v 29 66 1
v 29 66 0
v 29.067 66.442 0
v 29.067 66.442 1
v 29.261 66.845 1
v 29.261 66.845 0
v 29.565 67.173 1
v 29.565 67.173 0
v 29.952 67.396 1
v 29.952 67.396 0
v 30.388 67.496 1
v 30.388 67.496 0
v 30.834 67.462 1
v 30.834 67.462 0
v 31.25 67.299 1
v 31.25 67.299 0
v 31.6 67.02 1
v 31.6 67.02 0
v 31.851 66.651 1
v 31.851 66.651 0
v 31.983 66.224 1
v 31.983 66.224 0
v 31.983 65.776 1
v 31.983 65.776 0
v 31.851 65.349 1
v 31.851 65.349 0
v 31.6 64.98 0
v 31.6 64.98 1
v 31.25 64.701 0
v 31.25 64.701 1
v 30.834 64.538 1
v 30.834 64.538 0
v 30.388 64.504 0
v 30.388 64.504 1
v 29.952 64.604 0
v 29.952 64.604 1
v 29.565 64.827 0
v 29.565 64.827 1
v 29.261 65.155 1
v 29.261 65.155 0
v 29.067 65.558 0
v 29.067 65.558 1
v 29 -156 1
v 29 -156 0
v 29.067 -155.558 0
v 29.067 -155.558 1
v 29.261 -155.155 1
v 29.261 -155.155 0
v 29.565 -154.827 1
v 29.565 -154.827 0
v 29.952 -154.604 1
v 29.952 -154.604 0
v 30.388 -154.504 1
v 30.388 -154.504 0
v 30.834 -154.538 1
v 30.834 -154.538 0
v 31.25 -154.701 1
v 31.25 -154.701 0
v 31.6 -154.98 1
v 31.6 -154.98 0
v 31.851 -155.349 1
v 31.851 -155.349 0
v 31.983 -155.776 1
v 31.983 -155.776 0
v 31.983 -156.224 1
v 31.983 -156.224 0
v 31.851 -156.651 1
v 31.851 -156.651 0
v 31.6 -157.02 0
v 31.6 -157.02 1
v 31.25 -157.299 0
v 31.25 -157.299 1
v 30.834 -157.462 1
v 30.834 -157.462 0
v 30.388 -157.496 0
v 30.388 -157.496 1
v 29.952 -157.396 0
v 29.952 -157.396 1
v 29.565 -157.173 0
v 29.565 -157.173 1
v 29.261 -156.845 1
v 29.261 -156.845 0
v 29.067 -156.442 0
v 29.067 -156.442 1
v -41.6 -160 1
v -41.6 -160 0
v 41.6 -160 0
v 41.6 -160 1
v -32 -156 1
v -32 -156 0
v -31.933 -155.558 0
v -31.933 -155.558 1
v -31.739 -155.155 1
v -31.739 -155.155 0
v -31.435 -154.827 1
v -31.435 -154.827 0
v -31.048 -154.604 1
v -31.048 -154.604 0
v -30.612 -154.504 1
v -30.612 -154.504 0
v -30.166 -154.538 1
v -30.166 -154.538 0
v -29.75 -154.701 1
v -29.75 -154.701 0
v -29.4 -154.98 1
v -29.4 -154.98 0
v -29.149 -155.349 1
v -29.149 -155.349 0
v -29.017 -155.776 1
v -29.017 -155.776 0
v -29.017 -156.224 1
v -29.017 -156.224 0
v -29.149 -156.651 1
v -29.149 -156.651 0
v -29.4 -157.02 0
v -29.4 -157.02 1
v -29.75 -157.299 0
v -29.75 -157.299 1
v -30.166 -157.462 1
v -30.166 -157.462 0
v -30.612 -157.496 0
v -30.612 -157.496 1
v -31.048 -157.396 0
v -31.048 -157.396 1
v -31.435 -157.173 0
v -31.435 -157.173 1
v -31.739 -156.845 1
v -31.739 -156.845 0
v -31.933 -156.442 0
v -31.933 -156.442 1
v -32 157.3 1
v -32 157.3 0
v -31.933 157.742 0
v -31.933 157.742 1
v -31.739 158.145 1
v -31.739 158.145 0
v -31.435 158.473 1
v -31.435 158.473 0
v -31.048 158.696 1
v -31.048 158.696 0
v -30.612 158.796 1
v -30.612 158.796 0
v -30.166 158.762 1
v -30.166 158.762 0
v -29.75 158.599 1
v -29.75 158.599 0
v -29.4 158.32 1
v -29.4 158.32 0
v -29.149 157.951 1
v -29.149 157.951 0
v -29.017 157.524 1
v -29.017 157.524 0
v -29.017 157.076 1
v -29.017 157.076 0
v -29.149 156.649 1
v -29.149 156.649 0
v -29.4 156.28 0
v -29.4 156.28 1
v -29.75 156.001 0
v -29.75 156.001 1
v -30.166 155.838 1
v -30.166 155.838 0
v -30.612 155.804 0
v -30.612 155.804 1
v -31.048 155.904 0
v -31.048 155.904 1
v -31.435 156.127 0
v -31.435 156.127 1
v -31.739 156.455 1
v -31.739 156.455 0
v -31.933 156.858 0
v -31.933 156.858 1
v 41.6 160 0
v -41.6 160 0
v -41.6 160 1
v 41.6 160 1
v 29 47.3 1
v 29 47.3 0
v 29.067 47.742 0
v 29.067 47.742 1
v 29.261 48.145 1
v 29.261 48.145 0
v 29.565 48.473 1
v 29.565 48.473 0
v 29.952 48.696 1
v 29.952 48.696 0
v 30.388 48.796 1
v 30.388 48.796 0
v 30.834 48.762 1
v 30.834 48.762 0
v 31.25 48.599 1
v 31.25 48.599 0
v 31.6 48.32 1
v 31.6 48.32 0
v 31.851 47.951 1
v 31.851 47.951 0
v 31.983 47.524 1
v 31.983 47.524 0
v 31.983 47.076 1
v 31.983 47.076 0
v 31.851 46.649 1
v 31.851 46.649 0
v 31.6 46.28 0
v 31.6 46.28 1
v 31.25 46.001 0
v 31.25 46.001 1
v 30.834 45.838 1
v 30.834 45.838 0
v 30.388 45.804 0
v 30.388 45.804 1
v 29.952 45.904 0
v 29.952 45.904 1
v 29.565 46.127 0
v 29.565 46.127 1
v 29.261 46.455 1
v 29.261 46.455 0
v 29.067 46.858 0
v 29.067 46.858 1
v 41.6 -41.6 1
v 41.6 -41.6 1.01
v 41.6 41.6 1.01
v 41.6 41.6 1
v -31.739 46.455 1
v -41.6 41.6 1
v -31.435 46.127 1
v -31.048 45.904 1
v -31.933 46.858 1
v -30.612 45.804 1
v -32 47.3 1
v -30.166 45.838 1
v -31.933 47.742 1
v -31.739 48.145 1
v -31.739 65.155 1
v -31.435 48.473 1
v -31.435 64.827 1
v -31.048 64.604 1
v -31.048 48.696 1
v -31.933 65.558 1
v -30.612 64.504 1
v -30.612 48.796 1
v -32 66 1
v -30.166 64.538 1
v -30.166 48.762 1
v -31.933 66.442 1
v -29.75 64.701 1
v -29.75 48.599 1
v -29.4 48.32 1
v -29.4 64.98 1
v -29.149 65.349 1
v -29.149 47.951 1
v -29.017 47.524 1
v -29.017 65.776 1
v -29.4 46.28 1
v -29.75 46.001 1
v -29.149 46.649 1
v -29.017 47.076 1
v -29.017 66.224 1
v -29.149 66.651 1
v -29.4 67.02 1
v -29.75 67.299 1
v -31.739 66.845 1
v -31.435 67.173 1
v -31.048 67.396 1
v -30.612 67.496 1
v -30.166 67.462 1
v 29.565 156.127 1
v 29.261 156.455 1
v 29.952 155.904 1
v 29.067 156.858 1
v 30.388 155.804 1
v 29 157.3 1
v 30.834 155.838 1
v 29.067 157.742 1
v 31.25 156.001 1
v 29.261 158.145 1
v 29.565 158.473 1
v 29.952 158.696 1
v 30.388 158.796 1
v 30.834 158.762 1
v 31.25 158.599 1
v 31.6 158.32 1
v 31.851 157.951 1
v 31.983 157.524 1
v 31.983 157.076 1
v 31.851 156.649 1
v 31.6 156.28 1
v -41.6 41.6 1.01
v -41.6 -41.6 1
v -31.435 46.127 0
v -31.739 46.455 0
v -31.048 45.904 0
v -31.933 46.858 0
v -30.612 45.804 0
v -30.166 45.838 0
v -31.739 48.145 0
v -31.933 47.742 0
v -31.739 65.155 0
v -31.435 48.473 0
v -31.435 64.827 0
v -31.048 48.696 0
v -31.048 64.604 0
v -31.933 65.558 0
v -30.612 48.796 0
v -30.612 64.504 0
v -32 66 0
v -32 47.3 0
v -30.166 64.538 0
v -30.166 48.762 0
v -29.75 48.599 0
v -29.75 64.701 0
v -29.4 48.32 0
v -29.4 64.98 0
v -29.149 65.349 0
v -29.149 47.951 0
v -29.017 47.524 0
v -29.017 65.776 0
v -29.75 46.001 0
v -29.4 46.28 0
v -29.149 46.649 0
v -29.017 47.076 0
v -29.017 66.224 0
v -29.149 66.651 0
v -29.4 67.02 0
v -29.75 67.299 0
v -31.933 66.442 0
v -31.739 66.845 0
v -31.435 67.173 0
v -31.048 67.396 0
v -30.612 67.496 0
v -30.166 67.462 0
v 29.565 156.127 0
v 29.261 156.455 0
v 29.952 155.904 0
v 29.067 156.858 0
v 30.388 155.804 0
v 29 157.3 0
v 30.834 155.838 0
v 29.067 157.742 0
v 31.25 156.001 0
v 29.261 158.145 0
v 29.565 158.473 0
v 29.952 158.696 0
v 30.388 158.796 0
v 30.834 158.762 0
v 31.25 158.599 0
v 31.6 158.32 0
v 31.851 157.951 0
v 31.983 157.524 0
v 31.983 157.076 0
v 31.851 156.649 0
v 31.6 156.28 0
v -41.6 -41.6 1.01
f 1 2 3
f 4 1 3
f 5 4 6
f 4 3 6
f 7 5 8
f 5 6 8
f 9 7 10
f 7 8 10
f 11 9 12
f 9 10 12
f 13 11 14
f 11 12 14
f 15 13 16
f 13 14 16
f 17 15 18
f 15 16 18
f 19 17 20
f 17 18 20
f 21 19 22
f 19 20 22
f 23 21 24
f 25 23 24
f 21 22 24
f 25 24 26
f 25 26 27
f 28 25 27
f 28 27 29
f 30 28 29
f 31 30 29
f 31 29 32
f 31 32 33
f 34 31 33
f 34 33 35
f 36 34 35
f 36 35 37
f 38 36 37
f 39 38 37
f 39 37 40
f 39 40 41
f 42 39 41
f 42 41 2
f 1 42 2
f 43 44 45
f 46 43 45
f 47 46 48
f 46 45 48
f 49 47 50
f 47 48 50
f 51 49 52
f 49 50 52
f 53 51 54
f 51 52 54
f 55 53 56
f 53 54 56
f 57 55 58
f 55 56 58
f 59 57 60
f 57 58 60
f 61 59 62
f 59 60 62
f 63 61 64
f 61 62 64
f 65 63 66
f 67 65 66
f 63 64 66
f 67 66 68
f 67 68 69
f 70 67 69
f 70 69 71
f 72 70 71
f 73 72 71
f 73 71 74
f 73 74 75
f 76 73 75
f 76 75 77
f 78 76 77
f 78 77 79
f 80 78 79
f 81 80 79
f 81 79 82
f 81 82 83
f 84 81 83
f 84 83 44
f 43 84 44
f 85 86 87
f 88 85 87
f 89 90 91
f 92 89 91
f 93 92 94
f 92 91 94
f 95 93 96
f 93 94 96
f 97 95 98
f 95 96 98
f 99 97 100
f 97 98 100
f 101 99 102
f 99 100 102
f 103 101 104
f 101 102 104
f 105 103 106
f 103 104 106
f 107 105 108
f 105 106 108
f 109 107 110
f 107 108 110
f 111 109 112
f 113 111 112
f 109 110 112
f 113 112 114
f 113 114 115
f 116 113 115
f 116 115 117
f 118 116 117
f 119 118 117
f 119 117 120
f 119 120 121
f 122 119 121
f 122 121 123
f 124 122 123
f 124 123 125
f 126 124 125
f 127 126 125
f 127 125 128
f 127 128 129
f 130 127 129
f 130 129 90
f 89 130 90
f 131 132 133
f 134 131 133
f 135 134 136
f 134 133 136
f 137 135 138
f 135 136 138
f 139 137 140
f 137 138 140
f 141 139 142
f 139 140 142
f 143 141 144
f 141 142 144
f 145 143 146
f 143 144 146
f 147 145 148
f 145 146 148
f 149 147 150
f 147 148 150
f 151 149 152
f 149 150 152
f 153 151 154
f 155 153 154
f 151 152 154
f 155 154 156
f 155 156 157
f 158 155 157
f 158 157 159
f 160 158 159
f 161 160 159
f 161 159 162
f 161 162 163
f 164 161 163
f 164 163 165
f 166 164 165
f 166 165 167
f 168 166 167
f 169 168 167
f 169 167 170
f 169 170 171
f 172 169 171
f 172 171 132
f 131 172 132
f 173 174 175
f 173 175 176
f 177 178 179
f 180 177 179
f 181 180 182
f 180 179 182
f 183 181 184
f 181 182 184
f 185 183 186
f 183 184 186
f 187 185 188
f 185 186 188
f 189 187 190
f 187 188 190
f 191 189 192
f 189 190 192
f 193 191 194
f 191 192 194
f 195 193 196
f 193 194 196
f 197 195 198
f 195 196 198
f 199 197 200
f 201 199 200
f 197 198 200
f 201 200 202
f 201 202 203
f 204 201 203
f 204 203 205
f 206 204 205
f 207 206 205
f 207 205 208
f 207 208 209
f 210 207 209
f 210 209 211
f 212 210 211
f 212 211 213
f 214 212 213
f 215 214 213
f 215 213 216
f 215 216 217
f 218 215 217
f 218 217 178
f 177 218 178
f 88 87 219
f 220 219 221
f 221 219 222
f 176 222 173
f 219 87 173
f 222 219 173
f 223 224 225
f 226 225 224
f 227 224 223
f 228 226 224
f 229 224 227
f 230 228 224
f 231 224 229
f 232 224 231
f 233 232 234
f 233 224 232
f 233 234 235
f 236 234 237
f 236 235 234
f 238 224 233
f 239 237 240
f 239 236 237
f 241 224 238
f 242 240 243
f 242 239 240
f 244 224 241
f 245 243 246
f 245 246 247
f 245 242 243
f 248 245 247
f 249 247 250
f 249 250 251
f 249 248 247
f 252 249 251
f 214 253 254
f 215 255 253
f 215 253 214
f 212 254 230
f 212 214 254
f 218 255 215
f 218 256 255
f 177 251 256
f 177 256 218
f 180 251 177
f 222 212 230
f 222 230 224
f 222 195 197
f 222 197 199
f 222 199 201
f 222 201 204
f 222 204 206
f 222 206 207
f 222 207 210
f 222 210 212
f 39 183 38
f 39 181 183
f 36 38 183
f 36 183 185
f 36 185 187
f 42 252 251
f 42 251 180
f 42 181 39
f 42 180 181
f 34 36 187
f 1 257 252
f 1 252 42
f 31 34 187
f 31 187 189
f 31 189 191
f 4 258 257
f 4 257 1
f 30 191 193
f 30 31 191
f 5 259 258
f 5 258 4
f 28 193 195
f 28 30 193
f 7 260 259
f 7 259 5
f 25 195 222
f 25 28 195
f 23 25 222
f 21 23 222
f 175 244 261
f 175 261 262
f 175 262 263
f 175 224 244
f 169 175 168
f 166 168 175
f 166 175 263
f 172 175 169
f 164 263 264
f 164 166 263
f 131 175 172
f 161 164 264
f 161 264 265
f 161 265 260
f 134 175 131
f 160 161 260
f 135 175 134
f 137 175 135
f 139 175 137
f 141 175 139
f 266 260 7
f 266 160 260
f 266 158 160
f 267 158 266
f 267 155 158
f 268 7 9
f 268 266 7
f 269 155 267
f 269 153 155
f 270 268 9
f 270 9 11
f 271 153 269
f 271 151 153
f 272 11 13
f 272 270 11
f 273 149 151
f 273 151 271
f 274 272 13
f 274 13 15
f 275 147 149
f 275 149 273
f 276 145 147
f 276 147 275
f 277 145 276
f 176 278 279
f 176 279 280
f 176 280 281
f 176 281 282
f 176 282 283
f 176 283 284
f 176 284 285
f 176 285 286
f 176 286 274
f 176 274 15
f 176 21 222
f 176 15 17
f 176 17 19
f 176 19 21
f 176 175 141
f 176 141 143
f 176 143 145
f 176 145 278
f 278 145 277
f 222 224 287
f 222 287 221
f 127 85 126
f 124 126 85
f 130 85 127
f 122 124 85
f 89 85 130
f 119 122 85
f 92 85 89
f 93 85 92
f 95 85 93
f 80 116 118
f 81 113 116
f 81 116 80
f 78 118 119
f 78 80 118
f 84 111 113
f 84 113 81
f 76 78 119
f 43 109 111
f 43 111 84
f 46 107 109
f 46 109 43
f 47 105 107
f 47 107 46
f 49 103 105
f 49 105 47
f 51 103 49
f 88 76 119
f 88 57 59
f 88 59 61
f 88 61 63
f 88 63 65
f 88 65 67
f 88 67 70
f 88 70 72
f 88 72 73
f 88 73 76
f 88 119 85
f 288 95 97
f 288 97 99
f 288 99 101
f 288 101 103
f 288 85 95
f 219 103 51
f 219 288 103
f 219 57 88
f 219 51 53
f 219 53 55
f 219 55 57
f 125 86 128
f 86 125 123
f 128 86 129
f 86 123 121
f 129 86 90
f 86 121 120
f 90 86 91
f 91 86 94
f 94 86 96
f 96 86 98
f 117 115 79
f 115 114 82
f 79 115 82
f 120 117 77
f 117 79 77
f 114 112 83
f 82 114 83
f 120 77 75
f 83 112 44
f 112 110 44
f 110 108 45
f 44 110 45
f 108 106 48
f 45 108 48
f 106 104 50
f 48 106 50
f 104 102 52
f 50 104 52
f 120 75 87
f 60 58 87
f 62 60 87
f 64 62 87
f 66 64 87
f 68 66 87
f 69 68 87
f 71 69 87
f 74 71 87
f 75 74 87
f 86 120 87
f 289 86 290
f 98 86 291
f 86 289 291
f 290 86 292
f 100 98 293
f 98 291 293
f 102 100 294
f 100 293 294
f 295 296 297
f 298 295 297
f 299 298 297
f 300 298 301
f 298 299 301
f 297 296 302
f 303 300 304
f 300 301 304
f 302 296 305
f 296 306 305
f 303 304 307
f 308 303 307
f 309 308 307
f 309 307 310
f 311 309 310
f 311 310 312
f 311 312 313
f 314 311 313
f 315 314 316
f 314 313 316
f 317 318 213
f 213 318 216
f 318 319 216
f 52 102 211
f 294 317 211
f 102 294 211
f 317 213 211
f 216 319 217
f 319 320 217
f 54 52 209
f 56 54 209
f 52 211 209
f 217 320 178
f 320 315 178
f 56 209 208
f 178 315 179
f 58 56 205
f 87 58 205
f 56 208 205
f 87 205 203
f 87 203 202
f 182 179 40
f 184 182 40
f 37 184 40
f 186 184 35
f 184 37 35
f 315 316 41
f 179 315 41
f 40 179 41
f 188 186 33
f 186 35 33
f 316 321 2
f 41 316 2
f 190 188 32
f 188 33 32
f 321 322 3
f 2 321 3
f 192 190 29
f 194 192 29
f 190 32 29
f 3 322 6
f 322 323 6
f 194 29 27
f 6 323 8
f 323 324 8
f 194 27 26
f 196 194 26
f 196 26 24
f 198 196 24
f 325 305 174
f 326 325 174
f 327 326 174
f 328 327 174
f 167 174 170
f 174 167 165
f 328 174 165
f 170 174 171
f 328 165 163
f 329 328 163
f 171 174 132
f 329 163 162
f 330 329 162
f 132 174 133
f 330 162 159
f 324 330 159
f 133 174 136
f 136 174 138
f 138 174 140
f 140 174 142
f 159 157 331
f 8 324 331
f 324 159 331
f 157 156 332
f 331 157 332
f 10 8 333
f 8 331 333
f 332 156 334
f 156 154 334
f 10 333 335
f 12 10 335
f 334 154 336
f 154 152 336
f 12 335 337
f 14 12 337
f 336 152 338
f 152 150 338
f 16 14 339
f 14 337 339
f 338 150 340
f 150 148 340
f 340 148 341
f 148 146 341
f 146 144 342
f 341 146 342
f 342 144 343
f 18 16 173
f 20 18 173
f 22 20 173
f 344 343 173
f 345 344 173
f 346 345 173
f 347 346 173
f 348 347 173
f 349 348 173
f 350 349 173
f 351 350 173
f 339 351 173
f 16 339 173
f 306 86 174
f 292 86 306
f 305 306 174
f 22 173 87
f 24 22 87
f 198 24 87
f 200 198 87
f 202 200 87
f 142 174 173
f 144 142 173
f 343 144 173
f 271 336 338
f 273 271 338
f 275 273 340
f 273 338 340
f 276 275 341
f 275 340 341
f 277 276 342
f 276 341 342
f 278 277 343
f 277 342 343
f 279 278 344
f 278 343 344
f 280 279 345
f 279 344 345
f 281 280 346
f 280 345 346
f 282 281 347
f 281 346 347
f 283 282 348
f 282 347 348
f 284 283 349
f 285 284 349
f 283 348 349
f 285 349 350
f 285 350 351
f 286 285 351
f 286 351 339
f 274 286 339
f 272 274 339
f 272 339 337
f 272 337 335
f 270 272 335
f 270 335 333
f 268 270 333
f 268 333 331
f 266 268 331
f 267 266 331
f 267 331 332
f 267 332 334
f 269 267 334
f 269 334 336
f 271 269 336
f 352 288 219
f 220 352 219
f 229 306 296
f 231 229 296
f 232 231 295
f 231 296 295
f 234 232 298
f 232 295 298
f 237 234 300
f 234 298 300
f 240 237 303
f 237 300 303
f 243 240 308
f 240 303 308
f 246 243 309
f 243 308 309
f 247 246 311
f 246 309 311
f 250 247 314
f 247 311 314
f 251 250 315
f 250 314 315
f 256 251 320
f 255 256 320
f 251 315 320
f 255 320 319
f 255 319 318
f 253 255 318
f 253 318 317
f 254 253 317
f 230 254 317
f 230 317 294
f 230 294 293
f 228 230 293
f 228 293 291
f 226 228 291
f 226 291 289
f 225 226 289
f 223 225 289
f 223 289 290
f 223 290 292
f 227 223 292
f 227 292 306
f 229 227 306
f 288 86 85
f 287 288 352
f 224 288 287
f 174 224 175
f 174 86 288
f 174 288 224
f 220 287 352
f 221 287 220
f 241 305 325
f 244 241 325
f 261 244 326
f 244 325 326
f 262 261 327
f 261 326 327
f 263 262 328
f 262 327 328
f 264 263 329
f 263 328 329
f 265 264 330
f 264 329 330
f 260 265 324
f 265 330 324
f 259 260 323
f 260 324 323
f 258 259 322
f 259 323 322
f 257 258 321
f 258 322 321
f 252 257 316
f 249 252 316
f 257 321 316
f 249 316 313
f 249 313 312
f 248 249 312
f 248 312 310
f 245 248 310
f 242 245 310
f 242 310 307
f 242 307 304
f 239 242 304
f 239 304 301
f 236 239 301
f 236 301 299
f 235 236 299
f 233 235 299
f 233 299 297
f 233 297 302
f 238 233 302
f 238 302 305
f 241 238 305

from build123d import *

# Parameters (mm, degrees)
SKETCH1_W                = 83.2
SKETCH1_H                = 320
BOSS_EXTRUDE1_DEPTH      = 1
F_3_0_3_DIAMETER_HOLE1_D = 3
SKETCH_1_W               = 83.2
SKETCH_1_H               = 83.2
EXTRUDE_1_DEPTH          = 0.01


with BuildPart() as part:
    # Sketch1 → Boss-Extrude1 (new body)
    with BuildSketch(Plane.XY):
        Rectangle(SKETCH1_W, SKETCH1_H)
    extrude(amount=BOSS_EXTRUDE1_DEPTH)

    # Ø3.0 (3) Diameter Hole1 (through all)
    with Locations(Plane.XY.offset(1)):
        with Locations((-30.5, 66), (30.5, 66), (30.5, -156), (-30.5, -156), (-30.5, 157.3), (30.5, 157.3), (-30.5, 47.3), (30.5, 47.3)):
            Hole(F_3_0_3_DIAMETER_HOLE1_D / 2)

    # Эскиз1 → Бобышка-Вытянуть1 (add)
    with BuildSketch(Plane.XY.offset(1)):
        Rectangle(SKETCH_1_W, SKETCH_1_H)
    extrude(amount=EXTRUDE_1_DEPTH)


solid = part.part
